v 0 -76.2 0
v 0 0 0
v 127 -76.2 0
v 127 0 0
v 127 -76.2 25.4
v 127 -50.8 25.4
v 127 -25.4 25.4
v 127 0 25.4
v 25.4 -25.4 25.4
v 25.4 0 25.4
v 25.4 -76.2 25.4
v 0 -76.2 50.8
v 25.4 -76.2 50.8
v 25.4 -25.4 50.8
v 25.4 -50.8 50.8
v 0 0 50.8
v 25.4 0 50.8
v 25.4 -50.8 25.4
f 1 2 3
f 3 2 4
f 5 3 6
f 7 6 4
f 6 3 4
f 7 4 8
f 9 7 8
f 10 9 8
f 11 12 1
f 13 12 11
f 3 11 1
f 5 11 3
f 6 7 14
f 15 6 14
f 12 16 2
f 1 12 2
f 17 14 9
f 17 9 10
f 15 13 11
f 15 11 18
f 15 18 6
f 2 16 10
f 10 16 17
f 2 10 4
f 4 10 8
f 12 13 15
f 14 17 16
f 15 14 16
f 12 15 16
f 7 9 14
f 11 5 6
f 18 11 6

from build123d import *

# Parameters (mm, degrees)
F1_DEPTH = 76.2
F2_W     = 25.4
F2_H     = 25.4
F3_DEPTH = 101.6


with BuildPart() as f1:
    # F0 (on Front) → F1 (new body)
    with BuildSketch(Plane.XZ):
        Polygon((0, 50.8), (0, 0), (127, 0), (127, 25.4), (25.4, 50.8), align=None)
    extrude(amount=F1_DEPTH)

    # F2 (on face) → F3 (cut)
    with BuildSketch(Plane.YZ.offset(127)):
        with Locations((-63.5, 38.1)):
            Rectangle(F2_W, F2_H)
        with Locations((-12.7, 38.1)):
            Rectangle(F2_W, F2_H)
    extrude(amount=-F3_DEPTH, mode=Mode.SUBTRACT)


solid = f1.part
